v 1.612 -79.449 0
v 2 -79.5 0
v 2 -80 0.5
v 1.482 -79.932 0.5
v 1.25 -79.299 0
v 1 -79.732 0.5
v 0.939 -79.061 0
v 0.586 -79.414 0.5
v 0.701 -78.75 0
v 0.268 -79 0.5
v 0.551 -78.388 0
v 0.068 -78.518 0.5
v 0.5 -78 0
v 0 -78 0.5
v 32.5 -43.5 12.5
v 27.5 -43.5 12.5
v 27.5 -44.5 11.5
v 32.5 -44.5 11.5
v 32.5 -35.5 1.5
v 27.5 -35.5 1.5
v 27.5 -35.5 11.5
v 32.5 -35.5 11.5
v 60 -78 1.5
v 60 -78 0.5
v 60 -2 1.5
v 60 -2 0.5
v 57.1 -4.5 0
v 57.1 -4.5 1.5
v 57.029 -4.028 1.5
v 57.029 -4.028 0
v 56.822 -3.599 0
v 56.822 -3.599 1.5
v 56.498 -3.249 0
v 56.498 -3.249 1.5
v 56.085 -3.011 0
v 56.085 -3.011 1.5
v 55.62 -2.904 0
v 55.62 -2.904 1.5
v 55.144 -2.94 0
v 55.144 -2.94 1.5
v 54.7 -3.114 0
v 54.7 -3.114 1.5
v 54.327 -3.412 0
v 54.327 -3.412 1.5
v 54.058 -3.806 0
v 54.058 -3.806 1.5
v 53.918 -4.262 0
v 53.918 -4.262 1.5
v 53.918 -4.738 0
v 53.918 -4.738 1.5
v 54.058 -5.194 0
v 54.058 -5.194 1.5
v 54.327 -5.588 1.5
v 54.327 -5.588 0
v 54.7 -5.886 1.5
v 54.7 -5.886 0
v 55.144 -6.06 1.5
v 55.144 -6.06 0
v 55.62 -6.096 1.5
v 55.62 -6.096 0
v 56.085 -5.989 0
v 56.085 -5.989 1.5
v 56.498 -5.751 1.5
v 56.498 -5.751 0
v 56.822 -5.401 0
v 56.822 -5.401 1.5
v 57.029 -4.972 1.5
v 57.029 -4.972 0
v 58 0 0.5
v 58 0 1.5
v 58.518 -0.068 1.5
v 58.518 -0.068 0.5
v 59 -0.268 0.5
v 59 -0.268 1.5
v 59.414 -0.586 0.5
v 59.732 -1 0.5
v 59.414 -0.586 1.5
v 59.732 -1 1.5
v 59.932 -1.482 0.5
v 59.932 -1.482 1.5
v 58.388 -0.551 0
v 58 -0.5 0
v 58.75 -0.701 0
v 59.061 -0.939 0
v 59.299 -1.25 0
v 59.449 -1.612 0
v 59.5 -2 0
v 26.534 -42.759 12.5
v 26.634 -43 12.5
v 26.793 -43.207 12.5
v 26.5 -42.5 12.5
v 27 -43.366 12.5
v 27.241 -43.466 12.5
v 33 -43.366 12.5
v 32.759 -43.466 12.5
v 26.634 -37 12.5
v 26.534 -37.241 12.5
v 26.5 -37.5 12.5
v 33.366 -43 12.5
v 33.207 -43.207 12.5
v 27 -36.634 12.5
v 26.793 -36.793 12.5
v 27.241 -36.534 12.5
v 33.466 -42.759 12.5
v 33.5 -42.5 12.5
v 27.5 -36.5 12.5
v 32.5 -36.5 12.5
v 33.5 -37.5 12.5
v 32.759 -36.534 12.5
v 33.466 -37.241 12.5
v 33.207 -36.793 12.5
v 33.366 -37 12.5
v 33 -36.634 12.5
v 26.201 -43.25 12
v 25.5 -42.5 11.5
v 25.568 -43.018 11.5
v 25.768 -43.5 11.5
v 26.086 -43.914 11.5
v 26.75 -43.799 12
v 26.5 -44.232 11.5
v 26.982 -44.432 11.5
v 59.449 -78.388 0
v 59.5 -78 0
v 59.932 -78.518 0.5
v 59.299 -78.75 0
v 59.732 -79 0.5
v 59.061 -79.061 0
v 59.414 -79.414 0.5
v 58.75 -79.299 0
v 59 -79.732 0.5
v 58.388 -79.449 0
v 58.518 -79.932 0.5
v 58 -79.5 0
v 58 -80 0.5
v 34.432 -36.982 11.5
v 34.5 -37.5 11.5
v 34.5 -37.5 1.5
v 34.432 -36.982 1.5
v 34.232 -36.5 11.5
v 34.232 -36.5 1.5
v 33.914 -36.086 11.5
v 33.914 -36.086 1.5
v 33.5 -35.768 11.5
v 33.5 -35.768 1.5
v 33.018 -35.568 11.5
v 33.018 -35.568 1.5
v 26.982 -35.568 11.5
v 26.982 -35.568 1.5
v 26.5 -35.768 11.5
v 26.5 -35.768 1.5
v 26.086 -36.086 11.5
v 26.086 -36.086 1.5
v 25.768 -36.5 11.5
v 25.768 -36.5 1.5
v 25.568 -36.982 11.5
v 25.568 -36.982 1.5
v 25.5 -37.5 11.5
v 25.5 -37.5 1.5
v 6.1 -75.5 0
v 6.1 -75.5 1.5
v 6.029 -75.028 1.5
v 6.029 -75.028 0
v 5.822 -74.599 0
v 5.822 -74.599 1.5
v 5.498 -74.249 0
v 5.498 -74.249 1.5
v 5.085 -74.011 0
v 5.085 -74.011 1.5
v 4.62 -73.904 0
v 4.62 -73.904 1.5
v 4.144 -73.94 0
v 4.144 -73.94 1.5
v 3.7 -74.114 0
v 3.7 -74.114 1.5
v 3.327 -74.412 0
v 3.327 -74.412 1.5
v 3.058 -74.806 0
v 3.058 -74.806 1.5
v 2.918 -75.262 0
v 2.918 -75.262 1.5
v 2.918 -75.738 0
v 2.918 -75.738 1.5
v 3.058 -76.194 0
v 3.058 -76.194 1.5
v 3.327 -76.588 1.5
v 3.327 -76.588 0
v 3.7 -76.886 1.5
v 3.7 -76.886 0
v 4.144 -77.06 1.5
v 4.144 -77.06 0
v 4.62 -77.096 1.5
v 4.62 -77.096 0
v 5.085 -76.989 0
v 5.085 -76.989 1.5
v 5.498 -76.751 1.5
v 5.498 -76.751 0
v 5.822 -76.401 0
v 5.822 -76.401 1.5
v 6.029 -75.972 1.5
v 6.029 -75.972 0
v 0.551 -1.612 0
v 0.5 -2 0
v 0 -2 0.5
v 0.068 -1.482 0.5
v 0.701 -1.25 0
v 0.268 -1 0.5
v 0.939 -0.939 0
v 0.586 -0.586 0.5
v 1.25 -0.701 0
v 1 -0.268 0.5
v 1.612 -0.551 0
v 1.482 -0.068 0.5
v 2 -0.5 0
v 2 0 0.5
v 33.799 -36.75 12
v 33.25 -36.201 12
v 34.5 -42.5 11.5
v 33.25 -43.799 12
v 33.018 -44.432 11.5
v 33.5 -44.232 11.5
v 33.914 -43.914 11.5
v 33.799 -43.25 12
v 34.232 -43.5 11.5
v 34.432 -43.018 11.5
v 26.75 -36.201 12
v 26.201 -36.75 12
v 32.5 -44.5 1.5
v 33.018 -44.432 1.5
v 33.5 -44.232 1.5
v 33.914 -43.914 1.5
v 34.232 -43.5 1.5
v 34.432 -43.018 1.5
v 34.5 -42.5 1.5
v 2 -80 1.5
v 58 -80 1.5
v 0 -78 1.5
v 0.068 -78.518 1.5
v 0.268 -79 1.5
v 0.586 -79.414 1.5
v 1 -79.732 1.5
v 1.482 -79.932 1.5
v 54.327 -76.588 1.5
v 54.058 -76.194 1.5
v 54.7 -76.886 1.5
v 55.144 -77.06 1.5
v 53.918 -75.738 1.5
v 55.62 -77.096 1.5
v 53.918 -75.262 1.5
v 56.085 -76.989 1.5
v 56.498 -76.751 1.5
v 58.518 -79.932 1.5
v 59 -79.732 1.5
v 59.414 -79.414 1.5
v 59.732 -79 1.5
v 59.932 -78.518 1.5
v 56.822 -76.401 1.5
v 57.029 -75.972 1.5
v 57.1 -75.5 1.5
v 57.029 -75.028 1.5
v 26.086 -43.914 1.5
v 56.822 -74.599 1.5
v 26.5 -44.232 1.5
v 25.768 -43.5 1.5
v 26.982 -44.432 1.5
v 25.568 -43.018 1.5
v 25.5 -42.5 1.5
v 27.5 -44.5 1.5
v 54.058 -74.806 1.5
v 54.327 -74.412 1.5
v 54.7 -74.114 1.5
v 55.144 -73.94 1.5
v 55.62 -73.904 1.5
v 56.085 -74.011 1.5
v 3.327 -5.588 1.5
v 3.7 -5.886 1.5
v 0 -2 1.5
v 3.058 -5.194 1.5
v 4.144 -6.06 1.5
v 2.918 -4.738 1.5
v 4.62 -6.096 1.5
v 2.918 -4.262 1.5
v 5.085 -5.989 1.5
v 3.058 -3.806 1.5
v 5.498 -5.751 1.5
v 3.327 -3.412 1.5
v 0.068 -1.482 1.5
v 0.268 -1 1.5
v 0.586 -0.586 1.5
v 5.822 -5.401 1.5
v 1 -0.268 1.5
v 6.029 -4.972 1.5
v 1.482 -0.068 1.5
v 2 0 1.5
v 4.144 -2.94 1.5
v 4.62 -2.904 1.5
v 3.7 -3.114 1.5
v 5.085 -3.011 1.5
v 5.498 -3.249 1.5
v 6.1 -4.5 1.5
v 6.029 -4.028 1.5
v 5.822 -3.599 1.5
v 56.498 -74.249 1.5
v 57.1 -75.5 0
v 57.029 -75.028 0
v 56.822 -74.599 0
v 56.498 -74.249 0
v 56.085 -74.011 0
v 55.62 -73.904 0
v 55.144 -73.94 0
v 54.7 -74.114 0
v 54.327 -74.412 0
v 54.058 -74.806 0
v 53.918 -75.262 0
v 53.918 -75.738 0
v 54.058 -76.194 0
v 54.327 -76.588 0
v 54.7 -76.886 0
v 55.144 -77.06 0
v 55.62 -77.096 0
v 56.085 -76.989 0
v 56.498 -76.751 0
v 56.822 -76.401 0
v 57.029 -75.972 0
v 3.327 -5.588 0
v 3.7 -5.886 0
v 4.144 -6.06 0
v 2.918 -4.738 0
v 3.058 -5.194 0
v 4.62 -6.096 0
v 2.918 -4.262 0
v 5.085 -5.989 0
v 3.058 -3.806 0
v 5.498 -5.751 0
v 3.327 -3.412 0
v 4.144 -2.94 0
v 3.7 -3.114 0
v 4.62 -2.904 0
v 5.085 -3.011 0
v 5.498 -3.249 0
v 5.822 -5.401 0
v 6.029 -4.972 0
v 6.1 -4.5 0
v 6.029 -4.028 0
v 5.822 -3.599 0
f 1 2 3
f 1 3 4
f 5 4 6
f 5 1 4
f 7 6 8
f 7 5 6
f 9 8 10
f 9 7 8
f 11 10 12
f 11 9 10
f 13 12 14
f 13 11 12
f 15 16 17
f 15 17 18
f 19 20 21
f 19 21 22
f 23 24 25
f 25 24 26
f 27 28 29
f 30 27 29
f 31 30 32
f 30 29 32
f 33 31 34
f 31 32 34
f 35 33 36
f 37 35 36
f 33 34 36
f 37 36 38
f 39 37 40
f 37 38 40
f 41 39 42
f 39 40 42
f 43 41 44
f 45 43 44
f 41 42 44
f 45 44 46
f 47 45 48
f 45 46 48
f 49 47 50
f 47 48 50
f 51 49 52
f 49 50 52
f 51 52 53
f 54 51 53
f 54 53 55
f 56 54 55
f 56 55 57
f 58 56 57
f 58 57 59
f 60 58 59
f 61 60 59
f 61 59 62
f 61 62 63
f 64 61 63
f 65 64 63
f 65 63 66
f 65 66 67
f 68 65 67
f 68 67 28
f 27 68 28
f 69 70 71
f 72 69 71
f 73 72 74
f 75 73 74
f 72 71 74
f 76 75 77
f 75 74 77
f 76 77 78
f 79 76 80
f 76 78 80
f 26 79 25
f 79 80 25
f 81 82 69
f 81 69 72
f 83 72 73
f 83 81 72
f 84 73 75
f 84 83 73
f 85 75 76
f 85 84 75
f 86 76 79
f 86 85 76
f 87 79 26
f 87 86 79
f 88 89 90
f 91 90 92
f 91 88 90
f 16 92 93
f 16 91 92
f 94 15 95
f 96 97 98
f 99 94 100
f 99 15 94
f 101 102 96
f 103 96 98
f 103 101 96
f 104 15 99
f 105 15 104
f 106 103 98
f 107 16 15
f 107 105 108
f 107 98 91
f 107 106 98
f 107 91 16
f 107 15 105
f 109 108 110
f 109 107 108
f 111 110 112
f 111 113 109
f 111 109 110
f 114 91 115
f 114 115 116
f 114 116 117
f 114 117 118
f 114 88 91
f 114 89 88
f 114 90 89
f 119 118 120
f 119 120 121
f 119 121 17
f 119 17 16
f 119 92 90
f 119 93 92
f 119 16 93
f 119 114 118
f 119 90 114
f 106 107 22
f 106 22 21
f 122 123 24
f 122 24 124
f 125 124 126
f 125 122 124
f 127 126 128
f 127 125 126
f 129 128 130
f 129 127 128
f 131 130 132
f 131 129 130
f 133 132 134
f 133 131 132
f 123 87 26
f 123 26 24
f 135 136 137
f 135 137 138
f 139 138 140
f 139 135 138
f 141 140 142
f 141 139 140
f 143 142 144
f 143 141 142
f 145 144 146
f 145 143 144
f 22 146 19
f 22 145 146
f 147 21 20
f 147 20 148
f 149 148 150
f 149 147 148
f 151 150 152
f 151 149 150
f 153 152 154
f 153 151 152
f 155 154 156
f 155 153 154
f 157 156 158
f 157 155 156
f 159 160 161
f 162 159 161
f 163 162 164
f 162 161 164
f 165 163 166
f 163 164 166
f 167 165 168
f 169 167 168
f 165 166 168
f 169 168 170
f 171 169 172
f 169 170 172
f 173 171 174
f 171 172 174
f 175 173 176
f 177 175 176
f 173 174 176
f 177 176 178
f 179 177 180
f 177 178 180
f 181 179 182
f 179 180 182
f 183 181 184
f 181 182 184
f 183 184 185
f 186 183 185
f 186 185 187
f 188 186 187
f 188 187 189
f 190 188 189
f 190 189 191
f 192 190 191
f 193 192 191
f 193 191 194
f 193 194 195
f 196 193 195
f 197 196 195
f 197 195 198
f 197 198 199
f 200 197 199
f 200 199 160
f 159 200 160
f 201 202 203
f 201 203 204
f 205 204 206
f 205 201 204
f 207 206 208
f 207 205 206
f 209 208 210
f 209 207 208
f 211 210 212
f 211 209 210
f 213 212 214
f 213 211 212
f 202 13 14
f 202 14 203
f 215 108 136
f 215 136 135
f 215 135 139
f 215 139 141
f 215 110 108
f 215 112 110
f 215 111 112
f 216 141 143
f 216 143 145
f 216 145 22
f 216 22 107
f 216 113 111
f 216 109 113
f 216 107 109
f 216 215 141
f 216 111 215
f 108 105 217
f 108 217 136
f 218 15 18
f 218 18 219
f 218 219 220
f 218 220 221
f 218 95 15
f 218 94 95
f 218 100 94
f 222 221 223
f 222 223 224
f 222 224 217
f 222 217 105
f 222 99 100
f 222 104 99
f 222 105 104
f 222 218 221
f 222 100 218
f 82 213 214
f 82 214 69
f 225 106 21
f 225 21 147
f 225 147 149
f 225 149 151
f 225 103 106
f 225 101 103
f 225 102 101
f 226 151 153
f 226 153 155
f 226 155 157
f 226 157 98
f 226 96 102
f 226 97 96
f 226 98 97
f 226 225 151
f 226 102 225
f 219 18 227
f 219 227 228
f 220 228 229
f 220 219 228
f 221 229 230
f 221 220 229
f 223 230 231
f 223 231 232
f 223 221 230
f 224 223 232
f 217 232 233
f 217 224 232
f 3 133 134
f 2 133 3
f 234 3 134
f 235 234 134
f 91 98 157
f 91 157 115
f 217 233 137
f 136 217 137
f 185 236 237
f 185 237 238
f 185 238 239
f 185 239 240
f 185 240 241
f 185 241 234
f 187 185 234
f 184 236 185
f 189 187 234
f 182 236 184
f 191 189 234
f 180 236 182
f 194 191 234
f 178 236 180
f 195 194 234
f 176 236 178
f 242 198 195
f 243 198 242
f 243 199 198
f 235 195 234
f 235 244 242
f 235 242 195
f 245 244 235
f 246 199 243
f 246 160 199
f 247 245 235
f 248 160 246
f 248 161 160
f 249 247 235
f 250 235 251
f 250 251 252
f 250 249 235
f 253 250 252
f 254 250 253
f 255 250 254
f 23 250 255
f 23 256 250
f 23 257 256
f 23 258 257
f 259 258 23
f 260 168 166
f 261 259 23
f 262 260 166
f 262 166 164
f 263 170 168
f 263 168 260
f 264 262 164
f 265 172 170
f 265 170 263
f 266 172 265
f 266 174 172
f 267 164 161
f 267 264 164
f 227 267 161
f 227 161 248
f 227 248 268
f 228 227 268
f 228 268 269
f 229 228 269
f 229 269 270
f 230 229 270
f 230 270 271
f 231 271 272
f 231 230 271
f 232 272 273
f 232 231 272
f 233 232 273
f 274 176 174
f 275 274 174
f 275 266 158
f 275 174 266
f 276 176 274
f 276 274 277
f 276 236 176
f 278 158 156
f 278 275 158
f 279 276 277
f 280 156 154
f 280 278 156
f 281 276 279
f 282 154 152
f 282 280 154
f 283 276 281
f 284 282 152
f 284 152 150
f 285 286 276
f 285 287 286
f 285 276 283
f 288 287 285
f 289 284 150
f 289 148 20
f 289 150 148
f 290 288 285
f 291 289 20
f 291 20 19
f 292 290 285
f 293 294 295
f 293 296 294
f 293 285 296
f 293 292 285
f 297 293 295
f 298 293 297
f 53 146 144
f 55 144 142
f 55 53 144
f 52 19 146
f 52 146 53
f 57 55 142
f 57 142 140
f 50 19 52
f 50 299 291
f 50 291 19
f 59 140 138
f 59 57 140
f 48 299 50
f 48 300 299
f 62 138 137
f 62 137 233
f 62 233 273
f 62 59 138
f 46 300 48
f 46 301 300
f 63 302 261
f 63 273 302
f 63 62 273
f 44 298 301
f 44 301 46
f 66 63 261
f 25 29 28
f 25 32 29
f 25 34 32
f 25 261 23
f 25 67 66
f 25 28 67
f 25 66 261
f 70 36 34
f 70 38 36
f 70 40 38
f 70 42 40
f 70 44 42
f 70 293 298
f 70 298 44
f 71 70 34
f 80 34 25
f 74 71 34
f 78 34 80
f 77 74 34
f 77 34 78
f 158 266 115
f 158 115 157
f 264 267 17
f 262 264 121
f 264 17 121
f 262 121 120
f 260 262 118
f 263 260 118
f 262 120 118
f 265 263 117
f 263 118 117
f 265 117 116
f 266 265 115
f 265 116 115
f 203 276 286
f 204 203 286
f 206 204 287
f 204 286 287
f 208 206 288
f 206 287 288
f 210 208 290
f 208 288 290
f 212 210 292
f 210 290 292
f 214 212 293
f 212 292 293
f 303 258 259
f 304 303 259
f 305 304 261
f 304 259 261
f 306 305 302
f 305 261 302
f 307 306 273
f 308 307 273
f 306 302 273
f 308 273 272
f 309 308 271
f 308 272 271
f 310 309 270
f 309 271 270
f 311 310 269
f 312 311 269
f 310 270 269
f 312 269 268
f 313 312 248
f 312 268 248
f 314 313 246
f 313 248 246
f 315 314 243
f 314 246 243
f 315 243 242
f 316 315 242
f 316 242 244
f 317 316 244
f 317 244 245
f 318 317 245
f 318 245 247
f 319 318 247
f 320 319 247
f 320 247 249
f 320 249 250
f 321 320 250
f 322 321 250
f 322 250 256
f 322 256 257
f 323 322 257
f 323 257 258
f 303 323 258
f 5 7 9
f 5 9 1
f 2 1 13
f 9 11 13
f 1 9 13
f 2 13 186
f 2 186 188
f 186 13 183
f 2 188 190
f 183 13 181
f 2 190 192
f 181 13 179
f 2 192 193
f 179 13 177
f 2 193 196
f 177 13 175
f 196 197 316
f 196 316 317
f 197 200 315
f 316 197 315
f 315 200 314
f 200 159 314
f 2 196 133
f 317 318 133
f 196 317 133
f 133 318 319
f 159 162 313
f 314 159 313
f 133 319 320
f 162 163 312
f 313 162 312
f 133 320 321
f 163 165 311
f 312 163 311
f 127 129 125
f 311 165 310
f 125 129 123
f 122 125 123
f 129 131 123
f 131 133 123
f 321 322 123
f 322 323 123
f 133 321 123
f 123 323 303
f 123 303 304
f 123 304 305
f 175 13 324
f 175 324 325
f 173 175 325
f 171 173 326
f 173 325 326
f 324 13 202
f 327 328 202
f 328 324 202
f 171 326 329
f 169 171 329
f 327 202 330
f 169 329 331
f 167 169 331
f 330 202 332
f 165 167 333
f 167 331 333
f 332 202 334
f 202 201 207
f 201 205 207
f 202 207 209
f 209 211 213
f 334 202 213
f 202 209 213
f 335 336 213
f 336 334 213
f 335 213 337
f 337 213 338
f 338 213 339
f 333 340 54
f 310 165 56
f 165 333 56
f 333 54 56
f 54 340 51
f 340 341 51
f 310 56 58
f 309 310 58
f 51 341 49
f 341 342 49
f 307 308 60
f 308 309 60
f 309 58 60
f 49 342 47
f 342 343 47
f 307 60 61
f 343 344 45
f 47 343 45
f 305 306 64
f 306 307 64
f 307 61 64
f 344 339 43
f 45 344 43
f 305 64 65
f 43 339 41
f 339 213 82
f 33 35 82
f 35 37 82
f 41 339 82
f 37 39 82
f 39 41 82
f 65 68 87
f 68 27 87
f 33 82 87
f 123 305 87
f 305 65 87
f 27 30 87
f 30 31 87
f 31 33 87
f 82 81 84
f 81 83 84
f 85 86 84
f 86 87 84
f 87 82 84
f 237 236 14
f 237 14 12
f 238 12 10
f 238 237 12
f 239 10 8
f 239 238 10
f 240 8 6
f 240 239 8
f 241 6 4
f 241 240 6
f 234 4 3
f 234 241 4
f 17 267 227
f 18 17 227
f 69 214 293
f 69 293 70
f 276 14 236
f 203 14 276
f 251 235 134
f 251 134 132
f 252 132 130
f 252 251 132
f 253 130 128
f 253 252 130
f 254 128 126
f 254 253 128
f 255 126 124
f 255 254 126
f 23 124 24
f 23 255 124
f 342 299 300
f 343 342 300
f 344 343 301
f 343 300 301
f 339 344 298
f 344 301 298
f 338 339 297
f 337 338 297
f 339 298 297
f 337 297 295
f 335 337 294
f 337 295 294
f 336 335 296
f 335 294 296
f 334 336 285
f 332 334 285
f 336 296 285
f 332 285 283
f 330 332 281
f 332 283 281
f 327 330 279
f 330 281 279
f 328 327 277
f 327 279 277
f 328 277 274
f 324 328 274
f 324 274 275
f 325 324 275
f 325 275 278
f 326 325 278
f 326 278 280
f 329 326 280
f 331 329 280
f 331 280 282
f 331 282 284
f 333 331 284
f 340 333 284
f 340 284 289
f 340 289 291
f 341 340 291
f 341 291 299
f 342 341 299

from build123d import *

# Parameters (mm, degrees)
SKETCH_W        = 60
SKETCH_H        = 80
PAD_DEPTH       = 1.5
SKETCH001_R     = 1.6
POCKET_DEPTH    = 5
SKETCH002_W     = 9
SKETCH002_H     = 9
PAD001_DEPTH    = 11
FILLET_R        = 2
CHAMFER_SIZE    = 1
FILLET001_R     = 2
CHAMFER001_SIZE = 0.5


with BuildPart() as part:
    # Sketch → Pad (new body)
    with BuildSketch(Plane.XY):
        with Locations((30, -40)):
            Rectangle(SKETCH_W, SKETCH_H)
    extrude(amount=PAD_DEPTH)

    # Sketch001 (on Face6 of Pad) → Pocket (cut)
    with BuildSketch(Plane.XY.offset(1.5)):
        with Locations((4.5, -4.5)):
            Circle(SKETCH001_R)
        with Locations((55.5, -4.5)):
            Circle(SKETCH001_R)
        with Locations((4.5, -75.5)):
            Circle(SKETCH001_R)
        with Locations((55.5, -75.5)):
            Circle(SKETCH001_R)
    extrude(amount=-POCKET_DEPTH, mode=Mode.SUBTRACT)

    # Sketch002 (on Face5 of Pocket) → Pad001 (join)
    with BuildSketch(Plane.XY.offset(1.5)):
        with Locations((30, -40)):
            Rectangle(SKETCH002_W, SKETCH002_H)
    extrude(amount=PAD001_DEPTH)

    # Fillet
    fillet_edges = [part.edges().sort_by_distance(p)[0] for p in [
        (25.5, -44.5, 7),
        (34.5, -44.5, 7),
        (34.5, -35.5, 7),
        (25.5, -35.5, 7),
    ]]
    fillet(fillet_edges, radius=FILLET_R)

    # Chamfer
    chamfer_edges = [part.edges().sort_by_distance(p)[0] for p in [
        (30, -44.5, 12.5),
    ]]
    chamfer(chamfer_edges, length=CHAMFER_SIZE)

    # Fillet001
    fillet001_edges = [part.edges().sort_by_distance(p)[0] for p in [
        (0, -80, 0.75),
        (60, -80, 0.75),
        (60, 0, 0.75),
        (0, 0, 0.75),
    ]]
    fillet(fillet001_edges, radius=FILLET001_R)

    # Chamfer001
    chamfer001_edges = [part.edges().sort_by_distance(p)[0] for p in [
        (30, 0, 0),
    ]]
    chamfer(chamfer001_edges, length=CHAMFER001_SIZE)


solid = part.part
